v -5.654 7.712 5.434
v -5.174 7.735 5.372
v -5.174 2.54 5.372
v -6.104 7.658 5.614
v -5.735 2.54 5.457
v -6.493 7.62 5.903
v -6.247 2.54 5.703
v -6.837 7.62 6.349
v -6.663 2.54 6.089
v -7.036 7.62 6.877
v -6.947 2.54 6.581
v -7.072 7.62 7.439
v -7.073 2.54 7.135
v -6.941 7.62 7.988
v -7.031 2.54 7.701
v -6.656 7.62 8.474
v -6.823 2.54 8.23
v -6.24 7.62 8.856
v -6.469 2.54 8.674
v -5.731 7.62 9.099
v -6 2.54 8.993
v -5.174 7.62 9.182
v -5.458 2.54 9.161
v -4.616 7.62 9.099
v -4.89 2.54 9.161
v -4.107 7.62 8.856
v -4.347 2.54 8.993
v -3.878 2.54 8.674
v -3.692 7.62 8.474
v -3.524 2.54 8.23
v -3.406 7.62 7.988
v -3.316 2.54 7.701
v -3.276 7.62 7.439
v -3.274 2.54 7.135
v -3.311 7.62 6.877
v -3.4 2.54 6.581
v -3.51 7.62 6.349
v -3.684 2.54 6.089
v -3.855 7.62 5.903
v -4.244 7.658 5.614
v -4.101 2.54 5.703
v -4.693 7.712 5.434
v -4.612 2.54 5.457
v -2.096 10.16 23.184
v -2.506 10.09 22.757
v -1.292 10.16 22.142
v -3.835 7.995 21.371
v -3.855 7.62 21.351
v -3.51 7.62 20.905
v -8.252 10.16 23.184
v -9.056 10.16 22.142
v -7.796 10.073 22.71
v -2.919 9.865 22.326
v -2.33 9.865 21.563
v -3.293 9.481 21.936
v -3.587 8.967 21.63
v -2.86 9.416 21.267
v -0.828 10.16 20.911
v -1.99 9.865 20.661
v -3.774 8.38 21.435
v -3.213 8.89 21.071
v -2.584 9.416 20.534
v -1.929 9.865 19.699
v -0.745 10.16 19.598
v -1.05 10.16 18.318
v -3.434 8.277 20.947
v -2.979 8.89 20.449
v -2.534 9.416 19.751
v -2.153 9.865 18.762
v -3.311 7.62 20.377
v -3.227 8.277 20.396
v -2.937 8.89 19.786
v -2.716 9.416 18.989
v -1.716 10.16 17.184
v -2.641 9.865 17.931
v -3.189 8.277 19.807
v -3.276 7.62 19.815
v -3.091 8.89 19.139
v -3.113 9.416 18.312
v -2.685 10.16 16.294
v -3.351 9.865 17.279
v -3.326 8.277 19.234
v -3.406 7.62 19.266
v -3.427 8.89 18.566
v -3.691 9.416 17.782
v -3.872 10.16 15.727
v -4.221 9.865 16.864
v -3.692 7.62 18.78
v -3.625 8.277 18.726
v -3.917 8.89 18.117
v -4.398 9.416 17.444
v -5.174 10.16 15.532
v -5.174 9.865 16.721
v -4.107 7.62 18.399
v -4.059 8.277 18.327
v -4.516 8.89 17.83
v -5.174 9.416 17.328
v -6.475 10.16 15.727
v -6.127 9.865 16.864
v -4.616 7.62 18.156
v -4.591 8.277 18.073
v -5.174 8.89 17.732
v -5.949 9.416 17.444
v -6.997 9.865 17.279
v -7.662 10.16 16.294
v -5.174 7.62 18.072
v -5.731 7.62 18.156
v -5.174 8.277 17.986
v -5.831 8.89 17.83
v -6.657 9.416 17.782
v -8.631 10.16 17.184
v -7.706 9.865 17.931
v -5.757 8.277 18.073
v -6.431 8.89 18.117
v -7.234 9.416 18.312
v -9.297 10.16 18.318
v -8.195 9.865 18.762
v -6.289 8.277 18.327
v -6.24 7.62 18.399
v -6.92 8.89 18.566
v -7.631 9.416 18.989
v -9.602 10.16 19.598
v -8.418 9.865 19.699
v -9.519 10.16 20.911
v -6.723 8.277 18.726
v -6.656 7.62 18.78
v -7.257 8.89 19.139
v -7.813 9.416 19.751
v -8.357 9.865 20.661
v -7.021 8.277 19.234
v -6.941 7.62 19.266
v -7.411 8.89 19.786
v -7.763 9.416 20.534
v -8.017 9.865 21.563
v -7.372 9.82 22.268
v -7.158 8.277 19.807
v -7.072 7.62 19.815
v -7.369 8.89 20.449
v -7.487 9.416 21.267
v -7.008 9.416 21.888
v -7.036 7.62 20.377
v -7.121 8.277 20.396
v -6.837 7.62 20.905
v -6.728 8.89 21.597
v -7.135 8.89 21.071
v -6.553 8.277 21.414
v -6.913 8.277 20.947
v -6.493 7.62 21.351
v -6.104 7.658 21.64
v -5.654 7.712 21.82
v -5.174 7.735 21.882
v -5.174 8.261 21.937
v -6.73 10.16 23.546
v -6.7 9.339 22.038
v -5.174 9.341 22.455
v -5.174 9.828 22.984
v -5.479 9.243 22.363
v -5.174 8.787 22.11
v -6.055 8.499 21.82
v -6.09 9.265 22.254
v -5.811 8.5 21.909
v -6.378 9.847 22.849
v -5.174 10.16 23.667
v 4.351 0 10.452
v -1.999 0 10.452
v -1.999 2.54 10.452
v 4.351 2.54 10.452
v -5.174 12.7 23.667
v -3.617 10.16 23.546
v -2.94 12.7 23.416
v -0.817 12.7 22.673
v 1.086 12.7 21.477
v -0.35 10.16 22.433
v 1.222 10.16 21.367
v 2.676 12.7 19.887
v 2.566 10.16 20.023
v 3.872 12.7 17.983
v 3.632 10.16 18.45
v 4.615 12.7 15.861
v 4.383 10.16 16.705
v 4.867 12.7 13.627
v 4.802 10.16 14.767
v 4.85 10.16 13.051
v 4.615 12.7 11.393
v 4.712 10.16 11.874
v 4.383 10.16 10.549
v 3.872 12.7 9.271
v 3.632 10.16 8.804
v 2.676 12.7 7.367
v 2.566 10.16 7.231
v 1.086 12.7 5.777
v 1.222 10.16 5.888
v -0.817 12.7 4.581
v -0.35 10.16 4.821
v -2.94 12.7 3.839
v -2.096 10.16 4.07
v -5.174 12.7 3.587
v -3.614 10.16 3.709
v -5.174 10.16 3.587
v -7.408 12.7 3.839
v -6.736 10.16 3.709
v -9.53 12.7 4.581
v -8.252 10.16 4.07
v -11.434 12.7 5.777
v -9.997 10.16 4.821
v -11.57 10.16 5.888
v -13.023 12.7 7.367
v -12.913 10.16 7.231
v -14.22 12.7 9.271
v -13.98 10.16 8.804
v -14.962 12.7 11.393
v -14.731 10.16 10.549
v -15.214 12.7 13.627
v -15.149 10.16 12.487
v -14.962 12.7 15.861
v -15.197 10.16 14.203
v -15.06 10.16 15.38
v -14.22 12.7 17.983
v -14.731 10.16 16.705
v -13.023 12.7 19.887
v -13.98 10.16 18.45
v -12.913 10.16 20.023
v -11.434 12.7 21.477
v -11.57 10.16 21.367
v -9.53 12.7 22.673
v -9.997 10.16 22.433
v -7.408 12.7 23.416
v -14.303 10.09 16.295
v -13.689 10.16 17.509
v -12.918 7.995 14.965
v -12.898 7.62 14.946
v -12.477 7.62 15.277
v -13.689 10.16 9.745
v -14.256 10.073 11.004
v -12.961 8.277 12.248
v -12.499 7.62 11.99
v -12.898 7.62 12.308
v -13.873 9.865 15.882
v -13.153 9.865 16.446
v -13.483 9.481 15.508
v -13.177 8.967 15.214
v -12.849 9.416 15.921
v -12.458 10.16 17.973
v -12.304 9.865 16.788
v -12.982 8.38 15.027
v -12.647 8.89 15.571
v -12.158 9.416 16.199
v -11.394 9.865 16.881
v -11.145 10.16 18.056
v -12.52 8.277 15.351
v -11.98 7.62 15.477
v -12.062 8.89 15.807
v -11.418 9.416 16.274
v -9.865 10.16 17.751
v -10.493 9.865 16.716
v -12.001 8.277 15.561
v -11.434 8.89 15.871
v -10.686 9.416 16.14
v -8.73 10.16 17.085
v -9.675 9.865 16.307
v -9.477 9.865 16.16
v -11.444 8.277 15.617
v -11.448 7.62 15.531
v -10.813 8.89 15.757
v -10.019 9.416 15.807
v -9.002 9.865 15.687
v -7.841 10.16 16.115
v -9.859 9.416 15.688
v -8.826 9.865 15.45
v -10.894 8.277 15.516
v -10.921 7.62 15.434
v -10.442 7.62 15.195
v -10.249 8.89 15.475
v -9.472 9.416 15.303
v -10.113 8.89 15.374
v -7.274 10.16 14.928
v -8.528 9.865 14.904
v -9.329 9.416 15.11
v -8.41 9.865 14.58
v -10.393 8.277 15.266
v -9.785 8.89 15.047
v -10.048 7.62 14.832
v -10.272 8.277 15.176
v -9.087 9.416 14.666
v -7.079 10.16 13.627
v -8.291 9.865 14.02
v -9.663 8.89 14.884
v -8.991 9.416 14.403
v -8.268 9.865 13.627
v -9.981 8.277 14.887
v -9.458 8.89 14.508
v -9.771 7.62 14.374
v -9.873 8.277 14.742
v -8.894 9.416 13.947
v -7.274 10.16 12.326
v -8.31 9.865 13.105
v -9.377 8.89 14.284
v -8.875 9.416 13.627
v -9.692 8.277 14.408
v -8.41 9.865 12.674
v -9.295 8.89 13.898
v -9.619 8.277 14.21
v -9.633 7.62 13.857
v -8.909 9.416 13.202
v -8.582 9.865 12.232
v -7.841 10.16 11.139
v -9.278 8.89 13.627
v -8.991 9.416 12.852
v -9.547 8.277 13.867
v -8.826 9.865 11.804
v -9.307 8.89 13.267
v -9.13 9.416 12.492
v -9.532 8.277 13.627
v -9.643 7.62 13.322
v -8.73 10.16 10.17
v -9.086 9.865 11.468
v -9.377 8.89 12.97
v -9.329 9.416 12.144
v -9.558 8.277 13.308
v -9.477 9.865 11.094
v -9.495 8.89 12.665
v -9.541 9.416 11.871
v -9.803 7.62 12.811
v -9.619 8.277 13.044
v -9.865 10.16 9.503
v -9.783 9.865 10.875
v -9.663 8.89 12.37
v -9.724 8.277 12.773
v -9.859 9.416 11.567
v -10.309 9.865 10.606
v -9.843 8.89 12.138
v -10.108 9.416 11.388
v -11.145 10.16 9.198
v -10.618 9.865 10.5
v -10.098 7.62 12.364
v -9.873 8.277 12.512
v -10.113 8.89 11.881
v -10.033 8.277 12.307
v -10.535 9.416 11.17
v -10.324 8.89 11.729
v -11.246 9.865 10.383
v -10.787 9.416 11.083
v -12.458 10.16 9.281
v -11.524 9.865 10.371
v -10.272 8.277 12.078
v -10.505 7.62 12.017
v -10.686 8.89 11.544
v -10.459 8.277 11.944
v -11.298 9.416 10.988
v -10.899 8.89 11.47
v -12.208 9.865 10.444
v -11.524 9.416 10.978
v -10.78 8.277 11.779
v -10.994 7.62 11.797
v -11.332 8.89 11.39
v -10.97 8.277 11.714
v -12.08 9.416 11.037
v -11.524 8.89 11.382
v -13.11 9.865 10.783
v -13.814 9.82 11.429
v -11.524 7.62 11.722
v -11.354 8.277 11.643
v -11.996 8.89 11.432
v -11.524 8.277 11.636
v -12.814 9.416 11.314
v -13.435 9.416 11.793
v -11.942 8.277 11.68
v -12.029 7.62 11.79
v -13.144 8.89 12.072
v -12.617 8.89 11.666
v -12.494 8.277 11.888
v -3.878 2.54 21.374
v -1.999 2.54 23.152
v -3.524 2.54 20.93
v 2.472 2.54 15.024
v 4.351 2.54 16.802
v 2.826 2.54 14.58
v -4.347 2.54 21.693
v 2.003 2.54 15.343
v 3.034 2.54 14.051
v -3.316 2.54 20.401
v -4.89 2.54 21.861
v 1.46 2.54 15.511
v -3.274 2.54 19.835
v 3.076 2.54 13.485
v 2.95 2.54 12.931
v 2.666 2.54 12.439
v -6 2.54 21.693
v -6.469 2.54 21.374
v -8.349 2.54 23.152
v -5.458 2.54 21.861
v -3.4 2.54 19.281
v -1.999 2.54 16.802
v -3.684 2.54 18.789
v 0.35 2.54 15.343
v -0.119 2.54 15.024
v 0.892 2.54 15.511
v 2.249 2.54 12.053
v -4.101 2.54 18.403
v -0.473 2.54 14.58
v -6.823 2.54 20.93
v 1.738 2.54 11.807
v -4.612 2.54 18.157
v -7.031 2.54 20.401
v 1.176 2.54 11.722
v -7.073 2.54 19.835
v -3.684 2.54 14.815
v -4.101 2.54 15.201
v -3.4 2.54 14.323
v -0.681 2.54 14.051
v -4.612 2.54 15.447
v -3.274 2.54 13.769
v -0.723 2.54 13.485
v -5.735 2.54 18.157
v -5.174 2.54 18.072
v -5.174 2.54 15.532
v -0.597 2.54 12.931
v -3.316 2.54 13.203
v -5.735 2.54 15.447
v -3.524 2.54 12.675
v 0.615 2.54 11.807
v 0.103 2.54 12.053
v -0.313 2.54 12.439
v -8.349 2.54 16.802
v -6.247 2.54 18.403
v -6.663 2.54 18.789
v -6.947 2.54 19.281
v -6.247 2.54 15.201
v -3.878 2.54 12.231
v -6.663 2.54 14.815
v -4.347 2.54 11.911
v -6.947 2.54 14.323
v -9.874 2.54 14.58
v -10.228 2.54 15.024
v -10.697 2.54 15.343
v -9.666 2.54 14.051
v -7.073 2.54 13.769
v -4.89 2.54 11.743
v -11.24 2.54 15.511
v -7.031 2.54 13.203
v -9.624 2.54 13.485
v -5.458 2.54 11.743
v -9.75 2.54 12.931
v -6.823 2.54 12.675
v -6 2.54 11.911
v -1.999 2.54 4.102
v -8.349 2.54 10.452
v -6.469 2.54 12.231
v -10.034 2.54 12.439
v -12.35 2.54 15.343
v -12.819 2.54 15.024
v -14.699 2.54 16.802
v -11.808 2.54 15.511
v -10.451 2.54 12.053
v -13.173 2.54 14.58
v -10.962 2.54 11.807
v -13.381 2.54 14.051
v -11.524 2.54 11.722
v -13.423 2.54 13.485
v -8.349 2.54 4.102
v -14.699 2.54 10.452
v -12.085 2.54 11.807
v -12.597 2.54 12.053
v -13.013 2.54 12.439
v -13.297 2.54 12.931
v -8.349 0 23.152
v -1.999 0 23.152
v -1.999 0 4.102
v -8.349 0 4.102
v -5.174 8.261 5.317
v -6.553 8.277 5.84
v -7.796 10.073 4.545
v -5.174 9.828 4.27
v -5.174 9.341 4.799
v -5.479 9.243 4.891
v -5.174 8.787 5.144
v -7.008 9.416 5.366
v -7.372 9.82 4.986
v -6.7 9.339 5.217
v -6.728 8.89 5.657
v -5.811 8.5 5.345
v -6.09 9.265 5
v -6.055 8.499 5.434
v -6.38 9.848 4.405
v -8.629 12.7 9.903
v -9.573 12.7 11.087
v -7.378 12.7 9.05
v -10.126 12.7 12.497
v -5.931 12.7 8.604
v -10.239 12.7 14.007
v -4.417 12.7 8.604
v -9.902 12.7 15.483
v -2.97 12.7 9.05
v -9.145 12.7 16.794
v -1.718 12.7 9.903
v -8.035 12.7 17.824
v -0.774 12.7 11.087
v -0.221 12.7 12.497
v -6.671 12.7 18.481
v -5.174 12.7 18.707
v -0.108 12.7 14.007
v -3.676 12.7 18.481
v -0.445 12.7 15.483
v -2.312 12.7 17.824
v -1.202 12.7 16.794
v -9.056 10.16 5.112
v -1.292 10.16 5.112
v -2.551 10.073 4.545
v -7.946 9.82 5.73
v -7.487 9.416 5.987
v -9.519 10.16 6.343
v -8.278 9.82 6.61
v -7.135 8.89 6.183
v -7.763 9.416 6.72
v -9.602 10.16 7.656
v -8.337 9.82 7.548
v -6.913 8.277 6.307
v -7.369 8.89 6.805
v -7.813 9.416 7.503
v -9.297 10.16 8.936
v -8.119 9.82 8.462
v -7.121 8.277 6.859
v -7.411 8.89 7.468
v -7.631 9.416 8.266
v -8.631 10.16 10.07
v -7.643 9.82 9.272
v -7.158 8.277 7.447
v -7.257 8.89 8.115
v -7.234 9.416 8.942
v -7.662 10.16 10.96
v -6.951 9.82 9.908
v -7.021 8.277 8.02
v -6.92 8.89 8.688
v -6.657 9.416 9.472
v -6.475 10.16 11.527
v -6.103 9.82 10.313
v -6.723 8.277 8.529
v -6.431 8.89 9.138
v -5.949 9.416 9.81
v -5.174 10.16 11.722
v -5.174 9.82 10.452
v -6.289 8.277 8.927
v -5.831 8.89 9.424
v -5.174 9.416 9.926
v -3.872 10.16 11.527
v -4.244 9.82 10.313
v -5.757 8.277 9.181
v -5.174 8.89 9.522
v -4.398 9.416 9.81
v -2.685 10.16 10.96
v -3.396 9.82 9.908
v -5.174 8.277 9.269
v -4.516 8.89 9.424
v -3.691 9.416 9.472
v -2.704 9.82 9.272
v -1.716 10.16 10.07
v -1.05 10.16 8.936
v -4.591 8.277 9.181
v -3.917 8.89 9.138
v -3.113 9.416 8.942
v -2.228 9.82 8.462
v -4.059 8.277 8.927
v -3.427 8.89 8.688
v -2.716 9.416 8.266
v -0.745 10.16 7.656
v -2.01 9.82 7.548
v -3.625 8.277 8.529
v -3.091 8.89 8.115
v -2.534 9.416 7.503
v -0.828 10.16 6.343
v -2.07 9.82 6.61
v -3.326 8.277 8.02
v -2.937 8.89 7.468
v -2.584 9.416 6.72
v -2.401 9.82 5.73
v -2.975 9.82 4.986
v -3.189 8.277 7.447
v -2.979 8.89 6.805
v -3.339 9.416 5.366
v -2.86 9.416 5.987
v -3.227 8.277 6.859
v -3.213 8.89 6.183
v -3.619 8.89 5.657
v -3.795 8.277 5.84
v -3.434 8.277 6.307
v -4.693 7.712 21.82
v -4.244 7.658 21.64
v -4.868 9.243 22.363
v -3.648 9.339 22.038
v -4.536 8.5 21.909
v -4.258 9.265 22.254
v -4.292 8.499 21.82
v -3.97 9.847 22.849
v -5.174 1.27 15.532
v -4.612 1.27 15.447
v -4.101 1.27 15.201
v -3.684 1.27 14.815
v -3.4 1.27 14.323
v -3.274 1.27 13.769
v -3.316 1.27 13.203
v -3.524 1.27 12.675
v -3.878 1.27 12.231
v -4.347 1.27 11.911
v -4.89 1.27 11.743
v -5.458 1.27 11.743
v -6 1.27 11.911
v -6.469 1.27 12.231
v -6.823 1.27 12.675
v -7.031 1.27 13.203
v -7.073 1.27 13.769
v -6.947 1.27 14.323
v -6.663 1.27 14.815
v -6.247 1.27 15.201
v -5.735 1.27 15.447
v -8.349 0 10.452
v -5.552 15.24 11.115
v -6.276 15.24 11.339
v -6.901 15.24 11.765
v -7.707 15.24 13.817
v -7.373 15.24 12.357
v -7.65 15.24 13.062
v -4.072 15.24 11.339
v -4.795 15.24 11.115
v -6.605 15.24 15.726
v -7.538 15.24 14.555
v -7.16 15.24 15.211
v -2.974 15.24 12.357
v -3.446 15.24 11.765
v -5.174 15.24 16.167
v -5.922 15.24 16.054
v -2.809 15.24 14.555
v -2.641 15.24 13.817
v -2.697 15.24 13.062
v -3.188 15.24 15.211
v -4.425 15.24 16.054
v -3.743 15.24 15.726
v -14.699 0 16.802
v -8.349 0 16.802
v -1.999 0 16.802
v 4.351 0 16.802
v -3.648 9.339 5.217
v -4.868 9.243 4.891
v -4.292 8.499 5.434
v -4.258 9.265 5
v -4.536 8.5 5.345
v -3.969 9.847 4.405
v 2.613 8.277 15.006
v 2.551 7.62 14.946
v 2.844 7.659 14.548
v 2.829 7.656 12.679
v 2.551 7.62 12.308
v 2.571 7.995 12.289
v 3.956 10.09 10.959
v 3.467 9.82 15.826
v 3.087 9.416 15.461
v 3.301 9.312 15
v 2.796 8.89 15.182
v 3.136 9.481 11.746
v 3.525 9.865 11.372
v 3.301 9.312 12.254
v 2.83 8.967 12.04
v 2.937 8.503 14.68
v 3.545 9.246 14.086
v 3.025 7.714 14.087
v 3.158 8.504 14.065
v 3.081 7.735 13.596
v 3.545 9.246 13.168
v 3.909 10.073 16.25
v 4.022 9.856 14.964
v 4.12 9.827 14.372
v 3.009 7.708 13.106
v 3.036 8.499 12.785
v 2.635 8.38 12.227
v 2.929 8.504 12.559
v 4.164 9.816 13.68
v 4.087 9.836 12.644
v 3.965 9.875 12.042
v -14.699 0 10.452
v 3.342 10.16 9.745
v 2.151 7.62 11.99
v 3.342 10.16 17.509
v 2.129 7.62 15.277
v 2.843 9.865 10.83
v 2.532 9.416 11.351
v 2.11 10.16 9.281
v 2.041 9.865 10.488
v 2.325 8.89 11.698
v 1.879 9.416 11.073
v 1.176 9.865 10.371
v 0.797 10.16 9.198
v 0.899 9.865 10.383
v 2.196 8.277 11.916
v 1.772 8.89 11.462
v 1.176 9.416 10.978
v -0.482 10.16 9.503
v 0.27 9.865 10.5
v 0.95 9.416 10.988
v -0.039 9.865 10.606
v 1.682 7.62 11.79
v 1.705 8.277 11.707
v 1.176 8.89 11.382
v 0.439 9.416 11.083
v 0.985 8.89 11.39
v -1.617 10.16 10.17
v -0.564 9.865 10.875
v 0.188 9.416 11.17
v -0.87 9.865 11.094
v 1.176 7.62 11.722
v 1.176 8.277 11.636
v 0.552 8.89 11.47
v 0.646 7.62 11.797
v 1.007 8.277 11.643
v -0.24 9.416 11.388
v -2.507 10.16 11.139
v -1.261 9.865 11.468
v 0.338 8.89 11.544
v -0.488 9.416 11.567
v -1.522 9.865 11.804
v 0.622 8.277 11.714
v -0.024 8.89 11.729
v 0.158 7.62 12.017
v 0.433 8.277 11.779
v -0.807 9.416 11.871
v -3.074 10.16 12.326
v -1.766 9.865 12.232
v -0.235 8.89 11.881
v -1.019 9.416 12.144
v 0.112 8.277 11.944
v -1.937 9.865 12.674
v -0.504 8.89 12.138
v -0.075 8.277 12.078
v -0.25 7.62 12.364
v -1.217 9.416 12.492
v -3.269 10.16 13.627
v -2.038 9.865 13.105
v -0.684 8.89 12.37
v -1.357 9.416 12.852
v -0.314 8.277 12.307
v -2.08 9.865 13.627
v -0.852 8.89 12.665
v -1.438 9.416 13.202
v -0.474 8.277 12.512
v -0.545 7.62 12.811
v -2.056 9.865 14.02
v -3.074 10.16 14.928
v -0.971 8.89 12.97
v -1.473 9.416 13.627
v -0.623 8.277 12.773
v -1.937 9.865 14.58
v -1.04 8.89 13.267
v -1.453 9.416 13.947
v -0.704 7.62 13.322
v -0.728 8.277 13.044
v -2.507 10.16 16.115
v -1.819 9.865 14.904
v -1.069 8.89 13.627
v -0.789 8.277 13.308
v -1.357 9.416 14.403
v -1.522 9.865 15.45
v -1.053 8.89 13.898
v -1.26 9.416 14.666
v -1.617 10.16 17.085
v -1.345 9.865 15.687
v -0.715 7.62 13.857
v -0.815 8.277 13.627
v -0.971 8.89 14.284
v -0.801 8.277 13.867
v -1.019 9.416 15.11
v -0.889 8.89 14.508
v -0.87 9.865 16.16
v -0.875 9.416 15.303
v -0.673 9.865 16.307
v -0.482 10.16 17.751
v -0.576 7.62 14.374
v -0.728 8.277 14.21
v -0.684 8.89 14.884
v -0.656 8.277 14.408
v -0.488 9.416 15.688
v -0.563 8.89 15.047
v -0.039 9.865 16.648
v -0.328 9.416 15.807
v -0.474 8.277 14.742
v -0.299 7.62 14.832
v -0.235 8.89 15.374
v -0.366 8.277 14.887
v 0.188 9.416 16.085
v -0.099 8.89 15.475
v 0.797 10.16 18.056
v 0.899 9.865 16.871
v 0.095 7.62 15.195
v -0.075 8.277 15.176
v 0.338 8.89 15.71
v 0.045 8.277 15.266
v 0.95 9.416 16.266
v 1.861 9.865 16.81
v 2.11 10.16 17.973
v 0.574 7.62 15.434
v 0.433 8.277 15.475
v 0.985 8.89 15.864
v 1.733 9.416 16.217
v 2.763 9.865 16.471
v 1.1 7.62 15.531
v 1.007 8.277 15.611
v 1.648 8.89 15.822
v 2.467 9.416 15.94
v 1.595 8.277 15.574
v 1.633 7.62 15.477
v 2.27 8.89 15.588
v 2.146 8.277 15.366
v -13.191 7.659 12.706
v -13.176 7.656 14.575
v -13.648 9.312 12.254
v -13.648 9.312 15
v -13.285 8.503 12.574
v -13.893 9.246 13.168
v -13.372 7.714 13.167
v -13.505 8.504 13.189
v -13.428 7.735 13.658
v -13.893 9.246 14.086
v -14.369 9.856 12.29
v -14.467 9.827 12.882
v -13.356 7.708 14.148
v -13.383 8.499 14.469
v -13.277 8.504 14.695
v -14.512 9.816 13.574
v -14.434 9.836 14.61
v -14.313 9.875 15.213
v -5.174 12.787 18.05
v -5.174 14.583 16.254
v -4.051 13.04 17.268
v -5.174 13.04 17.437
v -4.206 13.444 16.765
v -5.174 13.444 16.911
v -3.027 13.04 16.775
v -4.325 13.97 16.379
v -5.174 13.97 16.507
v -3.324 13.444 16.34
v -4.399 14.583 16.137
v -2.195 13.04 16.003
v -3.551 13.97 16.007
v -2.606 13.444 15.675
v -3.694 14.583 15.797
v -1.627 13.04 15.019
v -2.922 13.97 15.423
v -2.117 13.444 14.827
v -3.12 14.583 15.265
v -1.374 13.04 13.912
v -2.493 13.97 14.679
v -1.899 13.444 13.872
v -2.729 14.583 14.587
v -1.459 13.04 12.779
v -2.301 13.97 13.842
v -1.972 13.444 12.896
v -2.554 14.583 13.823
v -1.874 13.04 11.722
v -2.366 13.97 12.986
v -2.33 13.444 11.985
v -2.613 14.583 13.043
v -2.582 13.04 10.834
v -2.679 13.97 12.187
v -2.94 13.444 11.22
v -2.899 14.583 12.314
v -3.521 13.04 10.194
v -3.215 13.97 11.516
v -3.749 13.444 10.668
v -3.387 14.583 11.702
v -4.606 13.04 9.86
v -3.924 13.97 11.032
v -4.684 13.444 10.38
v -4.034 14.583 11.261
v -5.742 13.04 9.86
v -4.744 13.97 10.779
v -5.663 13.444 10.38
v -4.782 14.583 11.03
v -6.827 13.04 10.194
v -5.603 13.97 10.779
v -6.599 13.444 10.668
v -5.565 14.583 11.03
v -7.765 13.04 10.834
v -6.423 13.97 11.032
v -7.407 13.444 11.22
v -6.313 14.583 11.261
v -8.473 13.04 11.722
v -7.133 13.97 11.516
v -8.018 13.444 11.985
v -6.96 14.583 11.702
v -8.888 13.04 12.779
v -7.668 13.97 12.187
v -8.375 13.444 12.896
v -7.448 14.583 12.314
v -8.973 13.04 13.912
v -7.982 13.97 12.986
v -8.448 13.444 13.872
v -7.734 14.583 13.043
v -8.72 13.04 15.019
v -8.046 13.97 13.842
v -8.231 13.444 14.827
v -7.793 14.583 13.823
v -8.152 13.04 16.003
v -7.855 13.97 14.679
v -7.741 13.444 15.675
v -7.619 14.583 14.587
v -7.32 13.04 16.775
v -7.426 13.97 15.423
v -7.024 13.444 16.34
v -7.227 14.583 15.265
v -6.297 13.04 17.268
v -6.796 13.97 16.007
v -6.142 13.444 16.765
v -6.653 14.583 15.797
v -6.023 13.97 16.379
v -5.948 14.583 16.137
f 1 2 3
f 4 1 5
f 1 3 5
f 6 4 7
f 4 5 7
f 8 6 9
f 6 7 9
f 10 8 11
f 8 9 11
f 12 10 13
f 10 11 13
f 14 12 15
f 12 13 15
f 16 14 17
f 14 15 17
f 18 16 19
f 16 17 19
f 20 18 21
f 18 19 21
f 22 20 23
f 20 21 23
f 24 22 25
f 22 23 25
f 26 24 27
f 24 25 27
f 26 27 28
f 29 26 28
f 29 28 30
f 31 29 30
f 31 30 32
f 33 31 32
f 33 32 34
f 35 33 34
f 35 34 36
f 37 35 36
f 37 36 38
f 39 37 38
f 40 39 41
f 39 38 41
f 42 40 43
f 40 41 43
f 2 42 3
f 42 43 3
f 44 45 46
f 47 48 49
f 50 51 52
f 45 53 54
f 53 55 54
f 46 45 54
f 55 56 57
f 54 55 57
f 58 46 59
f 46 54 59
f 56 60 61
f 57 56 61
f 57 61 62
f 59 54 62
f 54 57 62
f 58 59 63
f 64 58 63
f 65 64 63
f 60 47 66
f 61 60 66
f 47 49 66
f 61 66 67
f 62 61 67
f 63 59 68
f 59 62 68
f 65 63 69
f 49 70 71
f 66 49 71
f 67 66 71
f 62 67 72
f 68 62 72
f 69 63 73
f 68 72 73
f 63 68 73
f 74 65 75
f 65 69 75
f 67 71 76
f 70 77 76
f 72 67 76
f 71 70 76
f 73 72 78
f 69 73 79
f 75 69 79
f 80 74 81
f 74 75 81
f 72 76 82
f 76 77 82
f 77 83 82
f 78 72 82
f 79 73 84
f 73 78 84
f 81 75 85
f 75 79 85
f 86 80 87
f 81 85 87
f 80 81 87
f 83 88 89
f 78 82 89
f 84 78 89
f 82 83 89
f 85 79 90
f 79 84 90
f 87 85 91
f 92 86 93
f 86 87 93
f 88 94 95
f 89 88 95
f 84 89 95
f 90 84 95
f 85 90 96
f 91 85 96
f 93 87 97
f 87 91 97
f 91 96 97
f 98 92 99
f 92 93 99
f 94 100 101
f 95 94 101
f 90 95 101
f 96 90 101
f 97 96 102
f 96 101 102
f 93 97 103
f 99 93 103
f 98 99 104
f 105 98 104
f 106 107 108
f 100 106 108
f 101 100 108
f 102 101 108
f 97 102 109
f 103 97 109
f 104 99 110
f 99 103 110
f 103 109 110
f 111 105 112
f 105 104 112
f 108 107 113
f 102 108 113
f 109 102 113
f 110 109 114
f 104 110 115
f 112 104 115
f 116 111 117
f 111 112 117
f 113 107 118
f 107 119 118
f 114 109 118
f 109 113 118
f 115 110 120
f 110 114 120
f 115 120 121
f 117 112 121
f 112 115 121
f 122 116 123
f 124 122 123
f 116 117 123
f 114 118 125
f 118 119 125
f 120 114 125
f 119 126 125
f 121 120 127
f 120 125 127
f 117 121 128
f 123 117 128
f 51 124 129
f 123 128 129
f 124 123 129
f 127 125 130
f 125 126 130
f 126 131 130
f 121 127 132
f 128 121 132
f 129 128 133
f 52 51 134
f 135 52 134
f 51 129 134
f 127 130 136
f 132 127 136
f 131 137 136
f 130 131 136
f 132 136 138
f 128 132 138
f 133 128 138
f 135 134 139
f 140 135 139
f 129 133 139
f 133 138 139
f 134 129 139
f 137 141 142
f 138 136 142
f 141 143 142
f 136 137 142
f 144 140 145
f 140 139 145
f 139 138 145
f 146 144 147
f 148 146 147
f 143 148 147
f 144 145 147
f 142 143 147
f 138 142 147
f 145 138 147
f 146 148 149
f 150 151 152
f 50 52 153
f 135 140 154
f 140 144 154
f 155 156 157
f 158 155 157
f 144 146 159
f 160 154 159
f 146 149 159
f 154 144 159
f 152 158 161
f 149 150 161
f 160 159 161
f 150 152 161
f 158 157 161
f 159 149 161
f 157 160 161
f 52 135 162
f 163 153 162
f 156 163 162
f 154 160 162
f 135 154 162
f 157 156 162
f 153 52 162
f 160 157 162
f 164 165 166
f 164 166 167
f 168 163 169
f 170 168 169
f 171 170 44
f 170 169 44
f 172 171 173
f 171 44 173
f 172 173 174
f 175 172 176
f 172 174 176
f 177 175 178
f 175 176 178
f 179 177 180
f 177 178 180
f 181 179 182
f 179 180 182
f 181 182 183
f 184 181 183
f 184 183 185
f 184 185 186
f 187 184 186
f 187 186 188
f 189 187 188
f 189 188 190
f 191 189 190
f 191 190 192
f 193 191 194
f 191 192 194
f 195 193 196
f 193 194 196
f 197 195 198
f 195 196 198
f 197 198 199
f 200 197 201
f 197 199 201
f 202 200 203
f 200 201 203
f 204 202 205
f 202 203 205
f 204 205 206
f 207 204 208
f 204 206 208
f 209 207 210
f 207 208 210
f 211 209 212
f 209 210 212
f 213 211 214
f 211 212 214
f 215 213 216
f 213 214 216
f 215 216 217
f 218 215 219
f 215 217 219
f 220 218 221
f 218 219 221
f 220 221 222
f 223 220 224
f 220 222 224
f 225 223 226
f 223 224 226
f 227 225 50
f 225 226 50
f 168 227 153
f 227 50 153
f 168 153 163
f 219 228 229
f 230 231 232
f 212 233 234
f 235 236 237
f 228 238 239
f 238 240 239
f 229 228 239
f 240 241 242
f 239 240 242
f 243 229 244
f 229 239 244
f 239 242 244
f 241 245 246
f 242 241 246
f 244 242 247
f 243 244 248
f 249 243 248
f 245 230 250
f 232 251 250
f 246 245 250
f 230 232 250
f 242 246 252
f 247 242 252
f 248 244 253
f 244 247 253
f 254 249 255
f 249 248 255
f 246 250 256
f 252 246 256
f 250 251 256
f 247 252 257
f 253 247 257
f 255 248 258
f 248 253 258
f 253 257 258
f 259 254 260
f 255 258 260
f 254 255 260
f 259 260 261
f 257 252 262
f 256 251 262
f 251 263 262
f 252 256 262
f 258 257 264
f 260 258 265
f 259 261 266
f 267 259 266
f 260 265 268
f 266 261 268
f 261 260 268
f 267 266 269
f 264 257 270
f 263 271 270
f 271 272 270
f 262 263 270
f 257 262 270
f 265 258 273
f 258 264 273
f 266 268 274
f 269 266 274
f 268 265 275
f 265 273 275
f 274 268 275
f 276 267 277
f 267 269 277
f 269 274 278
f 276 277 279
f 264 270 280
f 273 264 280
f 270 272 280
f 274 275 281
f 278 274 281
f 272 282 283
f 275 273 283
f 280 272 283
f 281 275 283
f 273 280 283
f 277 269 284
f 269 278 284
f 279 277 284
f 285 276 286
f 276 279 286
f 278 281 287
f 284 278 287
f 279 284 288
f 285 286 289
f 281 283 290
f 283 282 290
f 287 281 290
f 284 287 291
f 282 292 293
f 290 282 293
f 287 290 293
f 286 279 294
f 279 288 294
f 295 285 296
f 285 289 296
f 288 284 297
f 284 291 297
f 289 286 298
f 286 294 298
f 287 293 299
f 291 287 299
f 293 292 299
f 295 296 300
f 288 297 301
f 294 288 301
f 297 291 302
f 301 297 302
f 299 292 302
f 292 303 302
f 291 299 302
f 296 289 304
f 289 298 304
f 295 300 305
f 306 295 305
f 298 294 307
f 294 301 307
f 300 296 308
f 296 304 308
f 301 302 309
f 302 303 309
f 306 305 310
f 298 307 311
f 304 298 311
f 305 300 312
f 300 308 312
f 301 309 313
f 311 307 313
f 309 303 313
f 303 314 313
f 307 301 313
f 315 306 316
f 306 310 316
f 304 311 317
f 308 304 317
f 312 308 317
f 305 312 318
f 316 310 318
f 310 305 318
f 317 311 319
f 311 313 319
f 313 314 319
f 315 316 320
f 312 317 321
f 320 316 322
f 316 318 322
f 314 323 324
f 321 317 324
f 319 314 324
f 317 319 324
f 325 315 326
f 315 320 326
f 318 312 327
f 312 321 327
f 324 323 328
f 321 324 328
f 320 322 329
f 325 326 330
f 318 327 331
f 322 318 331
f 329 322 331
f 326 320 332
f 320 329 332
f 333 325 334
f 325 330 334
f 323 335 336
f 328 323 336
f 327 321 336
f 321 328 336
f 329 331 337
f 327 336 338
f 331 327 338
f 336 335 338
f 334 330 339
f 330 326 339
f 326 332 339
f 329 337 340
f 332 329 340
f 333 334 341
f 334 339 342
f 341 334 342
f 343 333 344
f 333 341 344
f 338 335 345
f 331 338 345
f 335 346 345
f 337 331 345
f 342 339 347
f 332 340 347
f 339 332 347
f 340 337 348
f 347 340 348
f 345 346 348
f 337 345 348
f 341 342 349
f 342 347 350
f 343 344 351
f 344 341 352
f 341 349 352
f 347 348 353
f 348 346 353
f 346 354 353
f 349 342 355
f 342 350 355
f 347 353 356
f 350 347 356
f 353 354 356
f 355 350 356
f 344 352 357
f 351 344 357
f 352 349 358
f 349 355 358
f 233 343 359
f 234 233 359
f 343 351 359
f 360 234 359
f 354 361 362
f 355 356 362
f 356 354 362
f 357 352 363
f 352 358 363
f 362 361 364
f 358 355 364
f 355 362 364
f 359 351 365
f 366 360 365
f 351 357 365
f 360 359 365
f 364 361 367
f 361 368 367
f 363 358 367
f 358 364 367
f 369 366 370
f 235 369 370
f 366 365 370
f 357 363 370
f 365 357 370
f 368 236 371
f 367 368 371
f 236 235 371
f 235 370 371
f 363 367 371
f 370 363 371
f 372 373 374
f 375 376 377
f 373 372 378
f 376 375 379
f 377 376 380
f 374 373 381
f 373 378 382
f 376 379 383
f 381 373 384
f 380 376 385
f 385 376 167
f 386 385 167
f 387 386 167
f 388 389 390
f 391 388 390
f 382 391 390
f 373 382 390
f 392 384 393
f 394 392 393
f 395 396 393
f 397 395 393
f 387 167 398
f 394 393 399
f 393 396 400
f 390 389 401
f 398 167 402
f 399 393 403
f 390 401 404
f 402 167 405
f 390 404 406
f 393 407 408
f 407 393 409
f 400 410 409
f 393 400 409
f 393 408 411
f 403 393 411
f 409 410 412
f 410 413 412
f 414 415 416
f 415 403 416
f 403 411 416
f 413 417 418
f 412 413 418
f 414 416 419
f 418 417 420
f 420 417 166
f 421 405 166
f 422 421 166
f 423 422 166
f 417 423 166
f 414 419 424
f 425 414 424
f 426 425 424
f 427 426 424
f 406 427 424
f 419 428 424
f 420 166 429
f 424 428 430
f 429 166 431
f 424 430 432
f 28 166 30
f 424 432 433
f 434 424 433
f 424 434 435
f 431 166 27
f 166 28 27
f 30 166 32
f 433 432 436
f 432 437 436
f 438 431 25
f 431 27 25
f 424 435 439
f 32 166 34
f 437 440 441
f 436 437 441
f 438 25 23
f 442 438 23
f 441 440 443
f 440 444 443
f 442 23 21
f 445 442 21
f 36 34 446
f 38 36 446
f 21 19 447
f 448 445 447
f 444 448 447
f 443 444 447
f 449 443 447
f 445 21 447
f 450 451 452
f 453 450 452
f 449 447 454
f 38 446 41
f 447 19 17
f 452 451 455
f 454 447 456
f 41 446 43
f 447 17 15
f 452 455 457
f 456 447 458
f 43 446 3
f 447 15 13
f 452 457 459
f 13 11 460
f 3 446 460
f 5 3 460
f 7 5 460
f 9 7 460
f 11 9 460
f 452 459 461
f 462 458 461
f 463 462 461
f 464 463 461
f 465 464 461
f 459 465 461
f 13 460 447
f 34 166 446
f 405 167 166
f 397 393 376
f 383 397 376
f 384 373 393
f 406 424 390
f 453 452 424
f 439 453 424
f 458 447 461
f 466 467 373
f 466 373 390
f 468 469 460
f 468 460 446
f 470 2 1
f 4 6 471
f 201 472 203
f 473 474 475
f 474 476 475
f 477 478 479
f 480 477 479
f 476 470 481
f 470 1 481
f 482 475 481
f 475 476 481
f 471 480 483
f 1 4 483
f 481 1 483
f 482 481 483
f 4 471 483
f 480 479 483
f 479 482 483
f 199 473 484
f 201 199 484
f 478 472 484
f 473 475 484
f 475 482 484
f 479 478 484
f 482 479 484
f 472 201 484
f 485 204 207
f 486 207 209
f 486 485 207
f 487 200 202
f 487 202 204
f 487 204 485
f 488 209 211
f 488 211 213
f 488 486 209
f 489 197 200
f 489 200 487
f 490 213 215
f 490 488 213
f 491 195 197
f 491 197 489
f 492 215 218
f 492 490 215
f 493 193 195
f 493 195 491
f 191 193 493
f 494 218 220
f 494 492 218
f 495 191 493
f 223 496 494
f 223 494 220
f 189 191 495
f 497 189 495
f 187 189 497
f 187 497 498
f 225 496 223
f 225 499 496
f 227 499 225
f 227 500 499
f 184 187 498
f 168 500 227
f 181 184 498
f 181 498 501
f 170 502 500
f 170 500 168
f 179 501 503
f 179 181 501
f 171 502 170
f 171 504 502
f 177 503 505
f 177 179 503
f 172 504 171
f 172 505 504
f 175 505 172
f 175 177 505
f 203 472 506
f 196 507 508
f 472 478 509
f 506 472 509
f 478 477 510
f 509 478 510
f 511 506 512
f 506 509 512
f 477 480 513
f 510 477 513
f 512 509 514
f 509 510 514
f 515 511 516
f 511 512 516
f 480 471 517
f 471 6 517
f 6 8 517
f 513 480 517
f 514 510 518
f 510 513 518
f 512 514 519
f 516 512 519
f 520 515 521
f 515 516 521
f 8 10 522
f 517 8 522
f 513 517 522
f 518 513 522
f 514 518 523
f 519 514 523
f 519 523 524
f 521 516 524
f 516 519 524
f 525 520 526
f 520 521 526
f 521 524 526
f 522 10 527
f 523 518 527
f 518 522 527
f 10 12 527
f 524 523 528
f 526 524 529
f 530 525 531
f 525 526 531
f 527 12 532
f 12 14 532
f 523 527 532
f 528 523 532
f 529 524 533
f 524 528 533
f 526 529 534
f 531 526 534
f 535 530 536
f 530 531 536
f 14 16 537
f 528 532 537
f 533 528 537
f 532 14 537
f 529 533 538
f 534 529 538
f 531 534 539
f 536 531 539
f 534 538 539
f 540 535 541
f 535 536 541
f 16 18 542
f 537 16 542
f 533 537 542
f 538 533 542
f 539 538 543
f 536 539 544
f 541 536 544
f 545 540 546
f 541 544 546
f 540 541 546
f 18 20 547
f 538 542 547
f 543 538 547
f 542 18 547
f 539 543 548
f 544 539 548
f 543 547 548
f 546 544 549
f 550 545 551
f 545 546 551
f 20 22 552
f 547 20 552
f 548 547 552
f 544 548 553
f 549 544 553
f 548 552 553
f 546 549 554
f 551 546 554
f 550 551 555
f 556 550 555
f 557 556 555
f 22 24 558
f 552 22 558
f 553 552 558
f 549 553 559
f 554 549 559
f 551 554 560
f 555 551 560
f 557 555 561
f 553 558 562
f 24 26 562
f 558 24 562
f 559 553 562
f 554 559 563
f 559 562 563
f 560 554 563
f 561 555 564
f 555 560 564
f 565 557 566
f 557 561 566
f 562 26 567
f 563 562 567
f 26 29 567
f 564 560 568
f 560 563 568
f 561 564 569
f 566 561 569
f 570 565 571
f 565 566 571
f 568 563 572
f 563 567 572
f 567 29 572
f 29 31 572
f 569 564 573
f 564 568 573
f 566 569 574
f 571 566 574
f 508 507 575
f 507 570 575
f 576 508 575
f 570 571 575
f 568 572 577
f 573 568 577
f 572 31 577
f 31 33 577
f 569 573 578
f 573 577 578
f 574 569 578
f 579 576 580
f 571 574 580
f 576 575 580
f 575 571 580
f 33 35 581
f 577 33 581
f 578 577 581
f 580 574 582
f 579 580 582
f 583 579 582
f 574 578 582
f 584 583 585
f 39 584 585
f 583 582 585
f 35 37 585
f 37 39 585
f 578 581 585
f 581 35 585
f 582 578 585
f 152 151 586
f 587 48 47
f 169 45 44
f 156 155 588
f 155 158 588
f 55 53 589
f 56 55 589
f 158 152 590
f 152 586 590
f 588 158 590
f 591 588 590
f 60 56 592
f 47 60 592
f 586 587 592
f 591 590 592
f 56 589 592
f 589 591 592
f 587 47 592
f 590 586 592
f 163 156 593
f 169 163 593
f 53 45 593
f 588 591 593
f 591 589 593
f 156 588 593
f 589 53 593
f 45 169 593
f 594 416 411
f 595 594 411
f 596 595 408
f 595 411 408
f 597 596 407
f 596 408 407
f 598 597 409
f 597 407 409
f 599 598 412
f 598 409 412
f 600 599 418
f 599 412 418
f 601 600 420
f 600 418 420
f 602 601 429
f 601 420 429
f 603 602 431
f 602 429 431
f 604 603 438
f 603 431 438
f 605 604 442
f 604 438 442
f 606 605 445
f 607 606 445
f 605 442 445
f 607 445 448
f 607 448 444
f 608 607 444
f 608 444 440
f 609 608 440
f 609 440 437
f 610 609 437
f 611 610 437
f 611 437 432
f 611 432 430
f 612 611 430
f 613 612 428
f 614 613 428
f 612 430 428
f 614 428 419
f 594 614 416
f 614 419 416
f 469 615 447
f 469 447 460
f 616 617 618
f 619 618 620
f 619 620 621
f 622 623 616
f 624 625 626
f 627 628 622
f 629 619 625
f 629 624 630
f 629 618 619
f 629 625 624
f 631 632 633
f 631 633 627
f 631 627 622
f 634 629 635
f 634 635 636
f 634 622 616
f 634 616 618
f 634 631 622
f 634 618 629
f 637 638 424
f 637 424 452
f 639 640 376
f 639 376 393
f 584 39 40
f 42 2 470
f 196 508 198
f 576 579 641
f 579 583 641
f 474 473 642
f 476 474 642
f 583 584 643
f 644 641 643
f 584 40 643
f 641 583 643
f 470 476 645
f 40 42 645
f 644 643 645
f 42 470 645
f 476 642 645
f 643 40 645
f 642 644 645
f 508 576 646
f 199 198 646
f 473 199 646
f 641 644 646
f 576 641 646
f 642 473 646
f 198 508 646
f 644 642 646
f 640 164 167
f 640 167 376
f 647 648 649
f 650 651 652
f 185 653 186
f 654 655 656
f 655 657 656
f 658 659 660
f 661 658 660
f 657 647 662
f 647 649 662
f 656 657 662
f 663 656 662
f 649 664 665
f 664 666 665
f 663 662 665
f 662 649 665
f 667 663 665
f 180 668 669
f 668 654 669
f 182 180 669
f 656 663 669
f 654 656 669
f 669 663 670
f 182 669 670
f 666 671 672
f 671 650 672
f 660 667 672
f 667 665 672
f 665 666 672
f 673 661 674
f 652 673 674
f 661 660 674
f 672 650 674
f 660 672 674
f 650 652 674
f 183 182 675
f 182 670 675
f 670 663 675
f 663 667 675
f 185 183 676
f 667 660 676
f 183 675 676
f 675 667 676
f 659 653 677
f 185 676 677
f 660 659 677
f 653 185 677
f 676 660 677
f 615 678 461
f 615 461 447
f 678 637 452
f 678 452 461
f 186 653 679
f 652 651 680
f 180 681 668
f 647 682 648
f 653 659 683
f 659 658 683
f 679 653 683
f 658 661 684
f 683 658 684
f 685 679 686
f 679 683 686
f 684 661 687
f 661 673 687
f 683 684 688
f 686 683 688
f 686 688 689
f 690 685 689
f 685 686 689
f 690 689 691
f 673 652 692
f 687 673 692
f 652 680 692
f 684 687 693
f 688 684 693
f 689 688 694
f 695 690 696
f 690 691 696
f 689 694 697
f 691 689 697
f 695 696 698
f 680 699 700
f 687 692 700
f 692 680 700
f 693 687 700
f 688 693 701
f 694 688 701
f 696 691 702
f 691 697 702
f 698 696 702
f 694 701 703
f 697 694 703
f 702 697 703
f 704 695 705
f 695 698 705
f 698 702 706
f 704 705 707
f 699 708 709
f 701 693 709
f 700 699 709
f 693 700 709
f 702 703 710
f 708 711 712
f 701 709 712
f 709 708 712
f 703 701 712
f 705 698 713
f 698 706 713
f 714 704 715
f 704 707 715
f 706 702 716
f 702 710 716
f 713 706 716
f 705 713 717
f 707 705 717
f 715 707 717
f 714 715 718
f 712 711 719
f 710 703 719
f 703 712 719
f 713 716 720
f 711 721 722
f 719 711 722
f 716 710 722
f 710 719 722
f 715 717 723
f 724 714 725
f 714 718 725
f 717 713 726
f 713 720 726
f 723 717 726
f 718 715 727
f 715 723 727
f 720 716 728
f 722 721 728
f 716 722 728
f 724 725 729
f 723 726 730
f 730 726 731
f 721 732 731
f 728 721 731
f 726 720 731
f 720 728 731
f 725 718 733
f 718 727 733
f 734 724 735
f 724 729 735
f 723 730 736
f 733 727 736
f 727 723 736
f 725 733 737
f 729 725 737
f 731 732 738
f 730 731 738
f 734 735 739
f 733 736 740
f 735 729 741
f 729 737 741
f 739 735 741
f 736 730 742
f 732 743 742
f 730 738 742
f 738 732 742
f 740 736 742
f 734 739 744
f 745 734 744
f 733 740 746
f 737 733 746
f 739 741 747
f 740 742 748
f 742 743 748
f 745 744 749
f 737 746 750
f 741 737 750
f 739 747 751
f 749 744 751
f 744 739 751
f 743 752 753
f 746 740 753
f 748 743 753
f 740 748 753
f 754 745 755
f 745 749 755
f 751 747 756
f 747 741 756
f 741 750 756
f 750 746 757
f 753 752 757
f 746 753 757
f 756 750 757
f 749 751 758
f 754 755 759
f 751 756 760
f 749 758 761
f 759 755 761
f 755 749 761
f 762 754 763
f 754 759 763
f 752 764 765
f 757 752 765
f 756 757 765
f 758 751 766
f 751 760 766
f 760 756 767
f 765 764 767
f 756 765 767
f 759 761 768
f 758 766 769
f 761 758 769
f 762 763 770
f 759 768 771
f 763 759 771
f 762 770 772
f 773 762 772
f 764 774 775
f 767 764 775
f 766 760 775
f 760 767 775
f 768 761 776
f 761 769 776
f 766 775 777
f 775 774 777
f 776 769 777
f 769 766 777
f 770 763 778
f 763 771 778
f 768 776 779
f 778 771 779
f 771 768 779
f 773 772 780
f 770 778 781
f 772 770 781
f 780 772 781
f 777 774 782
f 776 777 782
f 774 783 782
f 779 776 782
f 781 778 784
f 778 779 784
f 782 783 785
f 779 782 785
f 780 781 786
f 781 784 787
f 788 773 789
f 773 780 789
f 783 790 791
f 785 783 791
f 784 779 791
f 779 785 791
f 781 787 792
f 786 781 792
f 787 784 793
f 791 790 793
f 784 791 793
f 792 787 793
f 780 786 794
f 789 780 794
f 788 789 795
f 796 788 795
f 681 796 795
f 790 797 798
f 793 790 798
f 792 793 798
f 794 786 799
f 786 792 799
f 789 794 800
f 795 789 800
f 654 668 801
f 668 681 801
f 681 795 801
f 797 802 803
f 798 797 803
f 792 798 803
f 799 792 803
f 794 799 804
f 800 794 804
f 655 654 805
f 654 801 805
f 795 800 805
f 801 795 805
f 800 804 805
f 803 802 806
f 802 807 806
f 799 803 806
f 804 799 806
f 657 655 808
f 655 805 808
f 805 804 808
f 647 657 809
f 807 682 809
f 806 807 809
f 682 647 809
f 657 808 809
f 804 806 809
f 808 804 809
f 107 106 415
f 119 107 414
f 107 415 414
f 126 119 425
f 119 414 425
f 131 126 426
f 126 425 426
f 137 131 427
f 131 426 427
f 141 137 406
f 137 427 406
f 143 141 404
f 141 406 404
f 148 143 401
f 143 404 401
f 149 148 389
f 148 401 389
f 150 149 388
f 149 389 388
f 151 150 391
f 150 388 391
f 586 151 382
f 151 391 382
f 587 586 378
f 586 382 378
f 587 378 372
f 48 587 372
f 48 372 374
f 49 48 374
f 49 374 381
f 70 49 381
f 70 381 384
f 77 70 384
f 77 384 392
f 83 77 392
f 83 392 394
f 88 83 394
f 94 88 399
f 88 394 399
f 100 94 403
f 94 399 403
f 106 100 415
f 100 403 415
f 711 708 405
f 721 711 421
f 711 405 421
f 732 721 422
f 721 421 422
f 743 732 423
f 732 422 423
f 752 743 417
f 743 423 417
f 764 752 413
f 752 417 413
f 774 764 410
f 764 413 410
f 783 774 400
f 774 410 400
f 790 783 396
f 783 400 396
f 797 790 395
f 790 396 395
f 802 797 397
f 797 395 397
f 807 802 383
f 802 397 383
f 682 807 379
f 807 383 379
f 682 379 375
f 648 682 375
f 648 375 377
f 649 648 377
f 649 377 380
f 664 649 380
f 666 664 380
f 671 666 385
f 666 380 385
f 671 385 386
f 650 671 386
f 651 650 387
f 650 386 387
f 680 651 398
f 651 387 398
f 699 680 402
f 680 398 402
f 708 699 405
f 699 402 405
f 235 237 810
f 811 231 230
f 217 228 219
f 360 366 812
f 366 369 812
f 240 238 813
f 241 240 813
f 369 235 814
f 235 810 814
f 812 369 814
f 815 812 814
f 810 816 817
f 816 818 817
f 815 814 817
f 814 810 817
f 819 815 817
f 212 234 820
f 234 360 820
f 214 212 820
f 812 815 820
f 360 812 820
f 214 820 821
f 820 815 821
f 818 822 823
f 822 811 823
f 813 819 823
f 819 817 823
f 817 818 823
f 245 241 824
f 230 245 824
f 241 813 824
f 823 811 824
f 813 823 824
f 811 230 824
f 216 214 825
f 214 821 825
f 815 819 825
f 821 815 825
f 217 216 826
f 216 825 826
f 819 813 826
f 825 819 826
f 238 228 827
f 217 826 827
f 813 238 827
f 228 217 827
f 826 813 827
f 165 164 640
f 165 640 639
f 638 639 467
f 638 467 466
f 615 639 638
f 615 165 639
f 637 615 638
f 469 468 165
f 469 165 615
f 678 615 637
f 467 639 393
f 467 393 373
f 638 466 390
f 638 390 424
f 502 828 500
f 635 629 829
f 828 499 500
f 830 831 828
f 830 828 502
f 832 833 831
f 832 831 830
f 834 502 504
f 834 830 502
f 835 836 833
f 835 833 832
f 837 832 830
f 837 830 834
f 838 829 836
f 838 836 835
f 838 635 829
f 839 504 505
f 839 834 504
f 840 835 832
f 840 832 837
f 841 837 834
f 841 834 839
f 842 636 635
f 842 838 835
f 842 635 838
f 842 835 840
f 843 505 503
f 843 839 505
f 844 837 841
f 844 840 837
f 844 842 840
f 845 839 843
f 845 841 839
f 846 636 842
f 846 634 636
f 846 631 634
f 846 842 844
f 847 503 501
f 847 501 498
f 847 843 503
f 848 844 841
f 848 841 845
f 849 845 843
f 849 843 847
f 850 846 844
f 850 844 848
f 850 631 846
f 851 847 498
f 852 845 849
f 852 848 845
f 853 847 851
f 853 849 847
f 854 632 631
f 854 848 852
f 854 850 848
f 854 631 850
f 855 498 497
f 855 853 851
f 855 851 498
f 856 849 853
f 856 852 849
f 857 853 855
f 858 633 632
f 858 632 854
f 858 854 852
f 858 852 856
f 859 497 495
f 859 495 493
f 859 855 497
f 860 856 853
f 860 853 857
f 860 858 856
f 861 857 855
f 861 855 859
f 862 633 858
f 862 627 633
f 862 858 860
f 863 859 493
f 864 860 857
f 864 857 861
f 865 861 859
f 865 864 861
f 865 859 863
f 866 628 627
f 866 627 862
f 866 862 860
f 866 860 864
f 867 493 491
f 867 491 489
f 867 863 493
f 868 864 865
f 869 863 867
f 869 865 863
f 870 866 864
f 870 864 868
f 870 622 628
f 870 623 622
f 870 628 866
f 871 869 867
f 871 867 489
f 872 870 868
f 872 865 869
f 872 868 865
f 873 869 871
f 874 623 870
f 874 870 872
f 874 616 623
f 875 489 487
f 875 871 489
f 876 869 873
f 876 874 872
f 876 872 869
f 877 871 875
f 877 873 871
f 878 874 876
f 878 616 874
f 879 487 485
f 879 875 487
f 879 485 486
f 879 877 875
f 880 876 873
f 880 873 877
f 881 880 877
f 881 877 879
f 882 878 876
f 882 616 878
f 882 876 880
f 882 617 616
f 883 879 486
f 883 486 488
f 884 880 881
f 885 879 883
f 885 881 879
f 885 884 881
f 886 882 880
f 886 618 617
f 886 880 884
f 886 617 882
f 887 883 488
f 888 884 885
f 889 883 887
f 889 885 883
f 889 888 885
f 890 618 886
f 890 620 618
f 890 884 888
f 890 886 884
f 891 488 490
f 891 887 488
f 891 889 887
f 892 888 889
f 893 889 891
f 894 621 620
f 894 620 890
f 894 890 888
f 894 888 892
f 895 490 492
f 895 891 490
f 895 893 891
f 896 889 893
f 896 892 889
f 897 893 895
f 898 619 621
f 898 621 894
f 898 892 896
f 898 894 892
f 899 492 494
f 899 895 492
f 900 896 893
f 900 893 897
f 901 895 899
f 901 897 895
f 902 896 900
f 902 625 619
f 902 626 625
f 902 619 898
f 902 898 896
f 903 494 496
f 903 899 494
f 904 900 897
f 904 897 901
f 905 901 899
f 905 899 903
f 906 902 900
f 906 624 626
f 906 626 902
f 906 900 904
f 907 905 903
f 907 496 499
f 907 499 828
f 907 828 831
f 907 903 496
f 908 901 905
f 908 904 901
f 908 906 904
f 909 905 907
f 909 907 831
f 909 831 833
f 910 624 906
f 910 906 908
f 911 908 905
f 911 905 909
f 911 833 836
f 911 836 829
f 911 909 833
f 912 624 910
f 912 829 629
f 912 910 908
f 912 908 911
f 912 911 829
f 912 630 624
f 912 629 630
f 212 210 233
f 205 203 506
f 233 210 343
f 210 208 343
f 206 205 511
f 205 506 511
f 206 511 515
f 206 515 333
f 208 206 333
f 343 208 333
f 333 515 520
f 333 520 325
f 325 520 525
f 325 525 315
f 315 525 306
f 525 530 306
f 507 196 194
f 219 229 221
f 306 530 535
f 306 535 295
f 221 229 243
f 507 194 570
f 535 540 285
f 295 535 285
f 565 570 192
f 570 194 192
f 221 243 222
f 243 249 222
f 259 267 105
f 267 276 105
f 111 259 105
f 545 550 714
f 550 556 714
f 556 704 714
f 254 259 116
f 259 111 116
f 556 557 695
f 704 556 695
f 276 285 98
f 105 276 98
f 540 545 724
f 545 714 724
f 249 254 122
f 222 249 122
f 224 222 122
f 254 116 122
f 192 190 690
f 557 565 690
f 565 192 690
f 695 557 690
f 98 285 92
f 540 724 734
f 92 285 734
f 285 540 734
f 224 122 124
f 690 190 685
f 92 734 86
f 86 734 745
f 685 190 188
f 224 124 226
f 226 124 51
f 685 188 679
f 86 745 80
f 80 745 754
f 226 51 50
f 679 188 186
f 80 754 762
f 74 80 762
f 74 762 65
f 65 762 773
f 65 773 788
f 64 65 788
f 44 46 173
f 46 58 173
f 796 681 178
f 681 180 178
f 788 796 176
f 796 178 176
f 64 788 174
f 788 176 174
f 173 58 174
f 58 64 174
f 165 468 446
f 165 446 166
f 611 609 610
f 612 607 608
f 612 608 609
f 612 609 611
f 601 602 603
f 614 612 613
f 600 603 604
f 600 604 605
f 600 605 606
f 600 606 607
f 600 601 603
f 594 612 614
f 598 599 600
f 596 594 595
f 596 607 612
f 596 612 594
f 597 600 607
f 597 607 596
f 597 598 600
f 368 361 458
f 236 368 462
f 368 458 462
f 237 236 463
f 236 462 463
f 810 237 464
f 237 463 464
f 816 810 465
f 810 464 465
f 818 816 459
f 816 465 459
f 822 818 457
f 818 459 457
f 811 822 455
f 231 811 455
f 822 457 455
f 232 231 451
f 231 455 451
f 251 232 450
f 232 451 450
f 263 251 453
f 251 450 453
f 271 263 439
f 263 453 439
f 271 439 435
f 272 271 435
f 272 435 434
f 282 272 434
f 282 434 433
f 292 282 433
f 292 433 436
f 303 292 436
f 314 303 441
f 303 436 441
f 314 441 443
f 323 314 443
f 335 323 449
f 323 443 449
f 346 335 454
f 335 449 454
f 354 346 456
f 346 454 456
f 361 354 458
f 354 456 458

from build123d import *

# Parameters (mm, degrees)
BODY_DEPTH        = 2.54
SKETCH2_R         = 1.905
LEGS_DEPTH        = 7.62
SKETCH4_R         = 1.905
SPRING_HOLE_DEPTH = 1.27
SKETCH5_R         = 10.040231571
FOOT_DEPTH        = 2.54
SKETCH6_R         = 2.54
FLAG_DEPTH        = 2.54
ROUNDITY_R        = 2.54


with BuildPart() as part:
    # Sketch1 → body (new body)
    with BuildSketch(Plane(origin=(0, 0, 0), x_dir=(1, 0, 0), z_dir=(0, 1, 0))):
        Polygon((-8.348684361, -10.452067183), (-8.348684361, -4.102067183), (-1.998684361, -4.102067183), (-1.998684361, -10.452067183), (4.351315639, -10.452067183), (4.351315639, -16.802067183), (-1.998684361, -16.802067183), (-1.998684361, -23.152067183), (-8.348684361, -23.152067183), (-8.348684361, -16.802067183), (-14.698684361, -16.802067183), (-14.698684361, -10.452067183), align=None)
    extrude(amount=BODY_DEPTH)

    # Sketch2 → legs (add)
    with BuildSketch(Plane(origin=(0, 2.54, 0), x_dir=(1, 0, 0), z_dir=(0, 1, 0))):
        with Locations(Location((-5.173684361, -7.277067183, 0), (0, 0, 90))):
            Circle(SKETCH2_R)
        with Locations(Location((1.176315639, -13.627067183, 0), (0, 0, 90))):
            Circle(SKETCH2_R)
        with Locations(Location((-5.173684361, -19.977067183, 0), (0, 0, 90))):
            Circle(SKETCH2_R)
        with Locations(Location((-11.523684361, -13.627067183, 0), (0, 0, 90))):
            Circle(SKETCH2_R)
    extrude(amount=LEGS_DEPTH)

    # Sketch4 → spring hole (cut)
    with BuildSketch(Plane(origin=(0, 2.54, 0), x_dir=(1, 0, 0), z_dir=(0, 1, 0))):
        with Locations(Location((-5.173684361, -13.627067183, 0), (0, 0, 270))):
            Circle(SKETCH4_R)
    extrude(amount=-SPRING_HOLE_DEPTH, mode=Mode.SUBTRACT)

    # Sketch5 → foot (add)
    with BuildSketch(Plane(origin=(0, 10.16, 0), x_dir=(1, 0, 0), z_dir=(0, 1, 0))):
        with Locations(Location((-5.173684361, -13.627067183, 0), (0, 0, 270))):
            Circle(SKETCH5_R)
    extrude(amount=FOOT_DEPTH)

    # Sketch6 → flag (add)
    with BuildSketch(Plane(origin=(0, 12.7, 0), x_dir=(1, 0, 0), z_dir=(0, 1, 0))):
        with Locations(Location((-5.173684361, -13.627067183, 0), (0, 0, 270))):
            Circle(SKETCH6_R)
    extrude(amount=FLAG_DEPTH)

    # roundity
    roundity_edges = [part.edges().sort_by_distance(p)[0] for p in [
        (-5.173684361, 10.16, 9.182067183),
        (1.176315639, 10.16, 15.532067183),
        (-5.173684361, 10.16, 21.882067183),
        (-11.523684361, 10.16, 15.532067183),
        (-5.173684361, 12.7, 11.087067183),
    ]]
    fillet(roundity_edges, radius=ROUNDITY_R - 0.0001)  # a hair under: the kernel refuses the full size


solid = part.part
